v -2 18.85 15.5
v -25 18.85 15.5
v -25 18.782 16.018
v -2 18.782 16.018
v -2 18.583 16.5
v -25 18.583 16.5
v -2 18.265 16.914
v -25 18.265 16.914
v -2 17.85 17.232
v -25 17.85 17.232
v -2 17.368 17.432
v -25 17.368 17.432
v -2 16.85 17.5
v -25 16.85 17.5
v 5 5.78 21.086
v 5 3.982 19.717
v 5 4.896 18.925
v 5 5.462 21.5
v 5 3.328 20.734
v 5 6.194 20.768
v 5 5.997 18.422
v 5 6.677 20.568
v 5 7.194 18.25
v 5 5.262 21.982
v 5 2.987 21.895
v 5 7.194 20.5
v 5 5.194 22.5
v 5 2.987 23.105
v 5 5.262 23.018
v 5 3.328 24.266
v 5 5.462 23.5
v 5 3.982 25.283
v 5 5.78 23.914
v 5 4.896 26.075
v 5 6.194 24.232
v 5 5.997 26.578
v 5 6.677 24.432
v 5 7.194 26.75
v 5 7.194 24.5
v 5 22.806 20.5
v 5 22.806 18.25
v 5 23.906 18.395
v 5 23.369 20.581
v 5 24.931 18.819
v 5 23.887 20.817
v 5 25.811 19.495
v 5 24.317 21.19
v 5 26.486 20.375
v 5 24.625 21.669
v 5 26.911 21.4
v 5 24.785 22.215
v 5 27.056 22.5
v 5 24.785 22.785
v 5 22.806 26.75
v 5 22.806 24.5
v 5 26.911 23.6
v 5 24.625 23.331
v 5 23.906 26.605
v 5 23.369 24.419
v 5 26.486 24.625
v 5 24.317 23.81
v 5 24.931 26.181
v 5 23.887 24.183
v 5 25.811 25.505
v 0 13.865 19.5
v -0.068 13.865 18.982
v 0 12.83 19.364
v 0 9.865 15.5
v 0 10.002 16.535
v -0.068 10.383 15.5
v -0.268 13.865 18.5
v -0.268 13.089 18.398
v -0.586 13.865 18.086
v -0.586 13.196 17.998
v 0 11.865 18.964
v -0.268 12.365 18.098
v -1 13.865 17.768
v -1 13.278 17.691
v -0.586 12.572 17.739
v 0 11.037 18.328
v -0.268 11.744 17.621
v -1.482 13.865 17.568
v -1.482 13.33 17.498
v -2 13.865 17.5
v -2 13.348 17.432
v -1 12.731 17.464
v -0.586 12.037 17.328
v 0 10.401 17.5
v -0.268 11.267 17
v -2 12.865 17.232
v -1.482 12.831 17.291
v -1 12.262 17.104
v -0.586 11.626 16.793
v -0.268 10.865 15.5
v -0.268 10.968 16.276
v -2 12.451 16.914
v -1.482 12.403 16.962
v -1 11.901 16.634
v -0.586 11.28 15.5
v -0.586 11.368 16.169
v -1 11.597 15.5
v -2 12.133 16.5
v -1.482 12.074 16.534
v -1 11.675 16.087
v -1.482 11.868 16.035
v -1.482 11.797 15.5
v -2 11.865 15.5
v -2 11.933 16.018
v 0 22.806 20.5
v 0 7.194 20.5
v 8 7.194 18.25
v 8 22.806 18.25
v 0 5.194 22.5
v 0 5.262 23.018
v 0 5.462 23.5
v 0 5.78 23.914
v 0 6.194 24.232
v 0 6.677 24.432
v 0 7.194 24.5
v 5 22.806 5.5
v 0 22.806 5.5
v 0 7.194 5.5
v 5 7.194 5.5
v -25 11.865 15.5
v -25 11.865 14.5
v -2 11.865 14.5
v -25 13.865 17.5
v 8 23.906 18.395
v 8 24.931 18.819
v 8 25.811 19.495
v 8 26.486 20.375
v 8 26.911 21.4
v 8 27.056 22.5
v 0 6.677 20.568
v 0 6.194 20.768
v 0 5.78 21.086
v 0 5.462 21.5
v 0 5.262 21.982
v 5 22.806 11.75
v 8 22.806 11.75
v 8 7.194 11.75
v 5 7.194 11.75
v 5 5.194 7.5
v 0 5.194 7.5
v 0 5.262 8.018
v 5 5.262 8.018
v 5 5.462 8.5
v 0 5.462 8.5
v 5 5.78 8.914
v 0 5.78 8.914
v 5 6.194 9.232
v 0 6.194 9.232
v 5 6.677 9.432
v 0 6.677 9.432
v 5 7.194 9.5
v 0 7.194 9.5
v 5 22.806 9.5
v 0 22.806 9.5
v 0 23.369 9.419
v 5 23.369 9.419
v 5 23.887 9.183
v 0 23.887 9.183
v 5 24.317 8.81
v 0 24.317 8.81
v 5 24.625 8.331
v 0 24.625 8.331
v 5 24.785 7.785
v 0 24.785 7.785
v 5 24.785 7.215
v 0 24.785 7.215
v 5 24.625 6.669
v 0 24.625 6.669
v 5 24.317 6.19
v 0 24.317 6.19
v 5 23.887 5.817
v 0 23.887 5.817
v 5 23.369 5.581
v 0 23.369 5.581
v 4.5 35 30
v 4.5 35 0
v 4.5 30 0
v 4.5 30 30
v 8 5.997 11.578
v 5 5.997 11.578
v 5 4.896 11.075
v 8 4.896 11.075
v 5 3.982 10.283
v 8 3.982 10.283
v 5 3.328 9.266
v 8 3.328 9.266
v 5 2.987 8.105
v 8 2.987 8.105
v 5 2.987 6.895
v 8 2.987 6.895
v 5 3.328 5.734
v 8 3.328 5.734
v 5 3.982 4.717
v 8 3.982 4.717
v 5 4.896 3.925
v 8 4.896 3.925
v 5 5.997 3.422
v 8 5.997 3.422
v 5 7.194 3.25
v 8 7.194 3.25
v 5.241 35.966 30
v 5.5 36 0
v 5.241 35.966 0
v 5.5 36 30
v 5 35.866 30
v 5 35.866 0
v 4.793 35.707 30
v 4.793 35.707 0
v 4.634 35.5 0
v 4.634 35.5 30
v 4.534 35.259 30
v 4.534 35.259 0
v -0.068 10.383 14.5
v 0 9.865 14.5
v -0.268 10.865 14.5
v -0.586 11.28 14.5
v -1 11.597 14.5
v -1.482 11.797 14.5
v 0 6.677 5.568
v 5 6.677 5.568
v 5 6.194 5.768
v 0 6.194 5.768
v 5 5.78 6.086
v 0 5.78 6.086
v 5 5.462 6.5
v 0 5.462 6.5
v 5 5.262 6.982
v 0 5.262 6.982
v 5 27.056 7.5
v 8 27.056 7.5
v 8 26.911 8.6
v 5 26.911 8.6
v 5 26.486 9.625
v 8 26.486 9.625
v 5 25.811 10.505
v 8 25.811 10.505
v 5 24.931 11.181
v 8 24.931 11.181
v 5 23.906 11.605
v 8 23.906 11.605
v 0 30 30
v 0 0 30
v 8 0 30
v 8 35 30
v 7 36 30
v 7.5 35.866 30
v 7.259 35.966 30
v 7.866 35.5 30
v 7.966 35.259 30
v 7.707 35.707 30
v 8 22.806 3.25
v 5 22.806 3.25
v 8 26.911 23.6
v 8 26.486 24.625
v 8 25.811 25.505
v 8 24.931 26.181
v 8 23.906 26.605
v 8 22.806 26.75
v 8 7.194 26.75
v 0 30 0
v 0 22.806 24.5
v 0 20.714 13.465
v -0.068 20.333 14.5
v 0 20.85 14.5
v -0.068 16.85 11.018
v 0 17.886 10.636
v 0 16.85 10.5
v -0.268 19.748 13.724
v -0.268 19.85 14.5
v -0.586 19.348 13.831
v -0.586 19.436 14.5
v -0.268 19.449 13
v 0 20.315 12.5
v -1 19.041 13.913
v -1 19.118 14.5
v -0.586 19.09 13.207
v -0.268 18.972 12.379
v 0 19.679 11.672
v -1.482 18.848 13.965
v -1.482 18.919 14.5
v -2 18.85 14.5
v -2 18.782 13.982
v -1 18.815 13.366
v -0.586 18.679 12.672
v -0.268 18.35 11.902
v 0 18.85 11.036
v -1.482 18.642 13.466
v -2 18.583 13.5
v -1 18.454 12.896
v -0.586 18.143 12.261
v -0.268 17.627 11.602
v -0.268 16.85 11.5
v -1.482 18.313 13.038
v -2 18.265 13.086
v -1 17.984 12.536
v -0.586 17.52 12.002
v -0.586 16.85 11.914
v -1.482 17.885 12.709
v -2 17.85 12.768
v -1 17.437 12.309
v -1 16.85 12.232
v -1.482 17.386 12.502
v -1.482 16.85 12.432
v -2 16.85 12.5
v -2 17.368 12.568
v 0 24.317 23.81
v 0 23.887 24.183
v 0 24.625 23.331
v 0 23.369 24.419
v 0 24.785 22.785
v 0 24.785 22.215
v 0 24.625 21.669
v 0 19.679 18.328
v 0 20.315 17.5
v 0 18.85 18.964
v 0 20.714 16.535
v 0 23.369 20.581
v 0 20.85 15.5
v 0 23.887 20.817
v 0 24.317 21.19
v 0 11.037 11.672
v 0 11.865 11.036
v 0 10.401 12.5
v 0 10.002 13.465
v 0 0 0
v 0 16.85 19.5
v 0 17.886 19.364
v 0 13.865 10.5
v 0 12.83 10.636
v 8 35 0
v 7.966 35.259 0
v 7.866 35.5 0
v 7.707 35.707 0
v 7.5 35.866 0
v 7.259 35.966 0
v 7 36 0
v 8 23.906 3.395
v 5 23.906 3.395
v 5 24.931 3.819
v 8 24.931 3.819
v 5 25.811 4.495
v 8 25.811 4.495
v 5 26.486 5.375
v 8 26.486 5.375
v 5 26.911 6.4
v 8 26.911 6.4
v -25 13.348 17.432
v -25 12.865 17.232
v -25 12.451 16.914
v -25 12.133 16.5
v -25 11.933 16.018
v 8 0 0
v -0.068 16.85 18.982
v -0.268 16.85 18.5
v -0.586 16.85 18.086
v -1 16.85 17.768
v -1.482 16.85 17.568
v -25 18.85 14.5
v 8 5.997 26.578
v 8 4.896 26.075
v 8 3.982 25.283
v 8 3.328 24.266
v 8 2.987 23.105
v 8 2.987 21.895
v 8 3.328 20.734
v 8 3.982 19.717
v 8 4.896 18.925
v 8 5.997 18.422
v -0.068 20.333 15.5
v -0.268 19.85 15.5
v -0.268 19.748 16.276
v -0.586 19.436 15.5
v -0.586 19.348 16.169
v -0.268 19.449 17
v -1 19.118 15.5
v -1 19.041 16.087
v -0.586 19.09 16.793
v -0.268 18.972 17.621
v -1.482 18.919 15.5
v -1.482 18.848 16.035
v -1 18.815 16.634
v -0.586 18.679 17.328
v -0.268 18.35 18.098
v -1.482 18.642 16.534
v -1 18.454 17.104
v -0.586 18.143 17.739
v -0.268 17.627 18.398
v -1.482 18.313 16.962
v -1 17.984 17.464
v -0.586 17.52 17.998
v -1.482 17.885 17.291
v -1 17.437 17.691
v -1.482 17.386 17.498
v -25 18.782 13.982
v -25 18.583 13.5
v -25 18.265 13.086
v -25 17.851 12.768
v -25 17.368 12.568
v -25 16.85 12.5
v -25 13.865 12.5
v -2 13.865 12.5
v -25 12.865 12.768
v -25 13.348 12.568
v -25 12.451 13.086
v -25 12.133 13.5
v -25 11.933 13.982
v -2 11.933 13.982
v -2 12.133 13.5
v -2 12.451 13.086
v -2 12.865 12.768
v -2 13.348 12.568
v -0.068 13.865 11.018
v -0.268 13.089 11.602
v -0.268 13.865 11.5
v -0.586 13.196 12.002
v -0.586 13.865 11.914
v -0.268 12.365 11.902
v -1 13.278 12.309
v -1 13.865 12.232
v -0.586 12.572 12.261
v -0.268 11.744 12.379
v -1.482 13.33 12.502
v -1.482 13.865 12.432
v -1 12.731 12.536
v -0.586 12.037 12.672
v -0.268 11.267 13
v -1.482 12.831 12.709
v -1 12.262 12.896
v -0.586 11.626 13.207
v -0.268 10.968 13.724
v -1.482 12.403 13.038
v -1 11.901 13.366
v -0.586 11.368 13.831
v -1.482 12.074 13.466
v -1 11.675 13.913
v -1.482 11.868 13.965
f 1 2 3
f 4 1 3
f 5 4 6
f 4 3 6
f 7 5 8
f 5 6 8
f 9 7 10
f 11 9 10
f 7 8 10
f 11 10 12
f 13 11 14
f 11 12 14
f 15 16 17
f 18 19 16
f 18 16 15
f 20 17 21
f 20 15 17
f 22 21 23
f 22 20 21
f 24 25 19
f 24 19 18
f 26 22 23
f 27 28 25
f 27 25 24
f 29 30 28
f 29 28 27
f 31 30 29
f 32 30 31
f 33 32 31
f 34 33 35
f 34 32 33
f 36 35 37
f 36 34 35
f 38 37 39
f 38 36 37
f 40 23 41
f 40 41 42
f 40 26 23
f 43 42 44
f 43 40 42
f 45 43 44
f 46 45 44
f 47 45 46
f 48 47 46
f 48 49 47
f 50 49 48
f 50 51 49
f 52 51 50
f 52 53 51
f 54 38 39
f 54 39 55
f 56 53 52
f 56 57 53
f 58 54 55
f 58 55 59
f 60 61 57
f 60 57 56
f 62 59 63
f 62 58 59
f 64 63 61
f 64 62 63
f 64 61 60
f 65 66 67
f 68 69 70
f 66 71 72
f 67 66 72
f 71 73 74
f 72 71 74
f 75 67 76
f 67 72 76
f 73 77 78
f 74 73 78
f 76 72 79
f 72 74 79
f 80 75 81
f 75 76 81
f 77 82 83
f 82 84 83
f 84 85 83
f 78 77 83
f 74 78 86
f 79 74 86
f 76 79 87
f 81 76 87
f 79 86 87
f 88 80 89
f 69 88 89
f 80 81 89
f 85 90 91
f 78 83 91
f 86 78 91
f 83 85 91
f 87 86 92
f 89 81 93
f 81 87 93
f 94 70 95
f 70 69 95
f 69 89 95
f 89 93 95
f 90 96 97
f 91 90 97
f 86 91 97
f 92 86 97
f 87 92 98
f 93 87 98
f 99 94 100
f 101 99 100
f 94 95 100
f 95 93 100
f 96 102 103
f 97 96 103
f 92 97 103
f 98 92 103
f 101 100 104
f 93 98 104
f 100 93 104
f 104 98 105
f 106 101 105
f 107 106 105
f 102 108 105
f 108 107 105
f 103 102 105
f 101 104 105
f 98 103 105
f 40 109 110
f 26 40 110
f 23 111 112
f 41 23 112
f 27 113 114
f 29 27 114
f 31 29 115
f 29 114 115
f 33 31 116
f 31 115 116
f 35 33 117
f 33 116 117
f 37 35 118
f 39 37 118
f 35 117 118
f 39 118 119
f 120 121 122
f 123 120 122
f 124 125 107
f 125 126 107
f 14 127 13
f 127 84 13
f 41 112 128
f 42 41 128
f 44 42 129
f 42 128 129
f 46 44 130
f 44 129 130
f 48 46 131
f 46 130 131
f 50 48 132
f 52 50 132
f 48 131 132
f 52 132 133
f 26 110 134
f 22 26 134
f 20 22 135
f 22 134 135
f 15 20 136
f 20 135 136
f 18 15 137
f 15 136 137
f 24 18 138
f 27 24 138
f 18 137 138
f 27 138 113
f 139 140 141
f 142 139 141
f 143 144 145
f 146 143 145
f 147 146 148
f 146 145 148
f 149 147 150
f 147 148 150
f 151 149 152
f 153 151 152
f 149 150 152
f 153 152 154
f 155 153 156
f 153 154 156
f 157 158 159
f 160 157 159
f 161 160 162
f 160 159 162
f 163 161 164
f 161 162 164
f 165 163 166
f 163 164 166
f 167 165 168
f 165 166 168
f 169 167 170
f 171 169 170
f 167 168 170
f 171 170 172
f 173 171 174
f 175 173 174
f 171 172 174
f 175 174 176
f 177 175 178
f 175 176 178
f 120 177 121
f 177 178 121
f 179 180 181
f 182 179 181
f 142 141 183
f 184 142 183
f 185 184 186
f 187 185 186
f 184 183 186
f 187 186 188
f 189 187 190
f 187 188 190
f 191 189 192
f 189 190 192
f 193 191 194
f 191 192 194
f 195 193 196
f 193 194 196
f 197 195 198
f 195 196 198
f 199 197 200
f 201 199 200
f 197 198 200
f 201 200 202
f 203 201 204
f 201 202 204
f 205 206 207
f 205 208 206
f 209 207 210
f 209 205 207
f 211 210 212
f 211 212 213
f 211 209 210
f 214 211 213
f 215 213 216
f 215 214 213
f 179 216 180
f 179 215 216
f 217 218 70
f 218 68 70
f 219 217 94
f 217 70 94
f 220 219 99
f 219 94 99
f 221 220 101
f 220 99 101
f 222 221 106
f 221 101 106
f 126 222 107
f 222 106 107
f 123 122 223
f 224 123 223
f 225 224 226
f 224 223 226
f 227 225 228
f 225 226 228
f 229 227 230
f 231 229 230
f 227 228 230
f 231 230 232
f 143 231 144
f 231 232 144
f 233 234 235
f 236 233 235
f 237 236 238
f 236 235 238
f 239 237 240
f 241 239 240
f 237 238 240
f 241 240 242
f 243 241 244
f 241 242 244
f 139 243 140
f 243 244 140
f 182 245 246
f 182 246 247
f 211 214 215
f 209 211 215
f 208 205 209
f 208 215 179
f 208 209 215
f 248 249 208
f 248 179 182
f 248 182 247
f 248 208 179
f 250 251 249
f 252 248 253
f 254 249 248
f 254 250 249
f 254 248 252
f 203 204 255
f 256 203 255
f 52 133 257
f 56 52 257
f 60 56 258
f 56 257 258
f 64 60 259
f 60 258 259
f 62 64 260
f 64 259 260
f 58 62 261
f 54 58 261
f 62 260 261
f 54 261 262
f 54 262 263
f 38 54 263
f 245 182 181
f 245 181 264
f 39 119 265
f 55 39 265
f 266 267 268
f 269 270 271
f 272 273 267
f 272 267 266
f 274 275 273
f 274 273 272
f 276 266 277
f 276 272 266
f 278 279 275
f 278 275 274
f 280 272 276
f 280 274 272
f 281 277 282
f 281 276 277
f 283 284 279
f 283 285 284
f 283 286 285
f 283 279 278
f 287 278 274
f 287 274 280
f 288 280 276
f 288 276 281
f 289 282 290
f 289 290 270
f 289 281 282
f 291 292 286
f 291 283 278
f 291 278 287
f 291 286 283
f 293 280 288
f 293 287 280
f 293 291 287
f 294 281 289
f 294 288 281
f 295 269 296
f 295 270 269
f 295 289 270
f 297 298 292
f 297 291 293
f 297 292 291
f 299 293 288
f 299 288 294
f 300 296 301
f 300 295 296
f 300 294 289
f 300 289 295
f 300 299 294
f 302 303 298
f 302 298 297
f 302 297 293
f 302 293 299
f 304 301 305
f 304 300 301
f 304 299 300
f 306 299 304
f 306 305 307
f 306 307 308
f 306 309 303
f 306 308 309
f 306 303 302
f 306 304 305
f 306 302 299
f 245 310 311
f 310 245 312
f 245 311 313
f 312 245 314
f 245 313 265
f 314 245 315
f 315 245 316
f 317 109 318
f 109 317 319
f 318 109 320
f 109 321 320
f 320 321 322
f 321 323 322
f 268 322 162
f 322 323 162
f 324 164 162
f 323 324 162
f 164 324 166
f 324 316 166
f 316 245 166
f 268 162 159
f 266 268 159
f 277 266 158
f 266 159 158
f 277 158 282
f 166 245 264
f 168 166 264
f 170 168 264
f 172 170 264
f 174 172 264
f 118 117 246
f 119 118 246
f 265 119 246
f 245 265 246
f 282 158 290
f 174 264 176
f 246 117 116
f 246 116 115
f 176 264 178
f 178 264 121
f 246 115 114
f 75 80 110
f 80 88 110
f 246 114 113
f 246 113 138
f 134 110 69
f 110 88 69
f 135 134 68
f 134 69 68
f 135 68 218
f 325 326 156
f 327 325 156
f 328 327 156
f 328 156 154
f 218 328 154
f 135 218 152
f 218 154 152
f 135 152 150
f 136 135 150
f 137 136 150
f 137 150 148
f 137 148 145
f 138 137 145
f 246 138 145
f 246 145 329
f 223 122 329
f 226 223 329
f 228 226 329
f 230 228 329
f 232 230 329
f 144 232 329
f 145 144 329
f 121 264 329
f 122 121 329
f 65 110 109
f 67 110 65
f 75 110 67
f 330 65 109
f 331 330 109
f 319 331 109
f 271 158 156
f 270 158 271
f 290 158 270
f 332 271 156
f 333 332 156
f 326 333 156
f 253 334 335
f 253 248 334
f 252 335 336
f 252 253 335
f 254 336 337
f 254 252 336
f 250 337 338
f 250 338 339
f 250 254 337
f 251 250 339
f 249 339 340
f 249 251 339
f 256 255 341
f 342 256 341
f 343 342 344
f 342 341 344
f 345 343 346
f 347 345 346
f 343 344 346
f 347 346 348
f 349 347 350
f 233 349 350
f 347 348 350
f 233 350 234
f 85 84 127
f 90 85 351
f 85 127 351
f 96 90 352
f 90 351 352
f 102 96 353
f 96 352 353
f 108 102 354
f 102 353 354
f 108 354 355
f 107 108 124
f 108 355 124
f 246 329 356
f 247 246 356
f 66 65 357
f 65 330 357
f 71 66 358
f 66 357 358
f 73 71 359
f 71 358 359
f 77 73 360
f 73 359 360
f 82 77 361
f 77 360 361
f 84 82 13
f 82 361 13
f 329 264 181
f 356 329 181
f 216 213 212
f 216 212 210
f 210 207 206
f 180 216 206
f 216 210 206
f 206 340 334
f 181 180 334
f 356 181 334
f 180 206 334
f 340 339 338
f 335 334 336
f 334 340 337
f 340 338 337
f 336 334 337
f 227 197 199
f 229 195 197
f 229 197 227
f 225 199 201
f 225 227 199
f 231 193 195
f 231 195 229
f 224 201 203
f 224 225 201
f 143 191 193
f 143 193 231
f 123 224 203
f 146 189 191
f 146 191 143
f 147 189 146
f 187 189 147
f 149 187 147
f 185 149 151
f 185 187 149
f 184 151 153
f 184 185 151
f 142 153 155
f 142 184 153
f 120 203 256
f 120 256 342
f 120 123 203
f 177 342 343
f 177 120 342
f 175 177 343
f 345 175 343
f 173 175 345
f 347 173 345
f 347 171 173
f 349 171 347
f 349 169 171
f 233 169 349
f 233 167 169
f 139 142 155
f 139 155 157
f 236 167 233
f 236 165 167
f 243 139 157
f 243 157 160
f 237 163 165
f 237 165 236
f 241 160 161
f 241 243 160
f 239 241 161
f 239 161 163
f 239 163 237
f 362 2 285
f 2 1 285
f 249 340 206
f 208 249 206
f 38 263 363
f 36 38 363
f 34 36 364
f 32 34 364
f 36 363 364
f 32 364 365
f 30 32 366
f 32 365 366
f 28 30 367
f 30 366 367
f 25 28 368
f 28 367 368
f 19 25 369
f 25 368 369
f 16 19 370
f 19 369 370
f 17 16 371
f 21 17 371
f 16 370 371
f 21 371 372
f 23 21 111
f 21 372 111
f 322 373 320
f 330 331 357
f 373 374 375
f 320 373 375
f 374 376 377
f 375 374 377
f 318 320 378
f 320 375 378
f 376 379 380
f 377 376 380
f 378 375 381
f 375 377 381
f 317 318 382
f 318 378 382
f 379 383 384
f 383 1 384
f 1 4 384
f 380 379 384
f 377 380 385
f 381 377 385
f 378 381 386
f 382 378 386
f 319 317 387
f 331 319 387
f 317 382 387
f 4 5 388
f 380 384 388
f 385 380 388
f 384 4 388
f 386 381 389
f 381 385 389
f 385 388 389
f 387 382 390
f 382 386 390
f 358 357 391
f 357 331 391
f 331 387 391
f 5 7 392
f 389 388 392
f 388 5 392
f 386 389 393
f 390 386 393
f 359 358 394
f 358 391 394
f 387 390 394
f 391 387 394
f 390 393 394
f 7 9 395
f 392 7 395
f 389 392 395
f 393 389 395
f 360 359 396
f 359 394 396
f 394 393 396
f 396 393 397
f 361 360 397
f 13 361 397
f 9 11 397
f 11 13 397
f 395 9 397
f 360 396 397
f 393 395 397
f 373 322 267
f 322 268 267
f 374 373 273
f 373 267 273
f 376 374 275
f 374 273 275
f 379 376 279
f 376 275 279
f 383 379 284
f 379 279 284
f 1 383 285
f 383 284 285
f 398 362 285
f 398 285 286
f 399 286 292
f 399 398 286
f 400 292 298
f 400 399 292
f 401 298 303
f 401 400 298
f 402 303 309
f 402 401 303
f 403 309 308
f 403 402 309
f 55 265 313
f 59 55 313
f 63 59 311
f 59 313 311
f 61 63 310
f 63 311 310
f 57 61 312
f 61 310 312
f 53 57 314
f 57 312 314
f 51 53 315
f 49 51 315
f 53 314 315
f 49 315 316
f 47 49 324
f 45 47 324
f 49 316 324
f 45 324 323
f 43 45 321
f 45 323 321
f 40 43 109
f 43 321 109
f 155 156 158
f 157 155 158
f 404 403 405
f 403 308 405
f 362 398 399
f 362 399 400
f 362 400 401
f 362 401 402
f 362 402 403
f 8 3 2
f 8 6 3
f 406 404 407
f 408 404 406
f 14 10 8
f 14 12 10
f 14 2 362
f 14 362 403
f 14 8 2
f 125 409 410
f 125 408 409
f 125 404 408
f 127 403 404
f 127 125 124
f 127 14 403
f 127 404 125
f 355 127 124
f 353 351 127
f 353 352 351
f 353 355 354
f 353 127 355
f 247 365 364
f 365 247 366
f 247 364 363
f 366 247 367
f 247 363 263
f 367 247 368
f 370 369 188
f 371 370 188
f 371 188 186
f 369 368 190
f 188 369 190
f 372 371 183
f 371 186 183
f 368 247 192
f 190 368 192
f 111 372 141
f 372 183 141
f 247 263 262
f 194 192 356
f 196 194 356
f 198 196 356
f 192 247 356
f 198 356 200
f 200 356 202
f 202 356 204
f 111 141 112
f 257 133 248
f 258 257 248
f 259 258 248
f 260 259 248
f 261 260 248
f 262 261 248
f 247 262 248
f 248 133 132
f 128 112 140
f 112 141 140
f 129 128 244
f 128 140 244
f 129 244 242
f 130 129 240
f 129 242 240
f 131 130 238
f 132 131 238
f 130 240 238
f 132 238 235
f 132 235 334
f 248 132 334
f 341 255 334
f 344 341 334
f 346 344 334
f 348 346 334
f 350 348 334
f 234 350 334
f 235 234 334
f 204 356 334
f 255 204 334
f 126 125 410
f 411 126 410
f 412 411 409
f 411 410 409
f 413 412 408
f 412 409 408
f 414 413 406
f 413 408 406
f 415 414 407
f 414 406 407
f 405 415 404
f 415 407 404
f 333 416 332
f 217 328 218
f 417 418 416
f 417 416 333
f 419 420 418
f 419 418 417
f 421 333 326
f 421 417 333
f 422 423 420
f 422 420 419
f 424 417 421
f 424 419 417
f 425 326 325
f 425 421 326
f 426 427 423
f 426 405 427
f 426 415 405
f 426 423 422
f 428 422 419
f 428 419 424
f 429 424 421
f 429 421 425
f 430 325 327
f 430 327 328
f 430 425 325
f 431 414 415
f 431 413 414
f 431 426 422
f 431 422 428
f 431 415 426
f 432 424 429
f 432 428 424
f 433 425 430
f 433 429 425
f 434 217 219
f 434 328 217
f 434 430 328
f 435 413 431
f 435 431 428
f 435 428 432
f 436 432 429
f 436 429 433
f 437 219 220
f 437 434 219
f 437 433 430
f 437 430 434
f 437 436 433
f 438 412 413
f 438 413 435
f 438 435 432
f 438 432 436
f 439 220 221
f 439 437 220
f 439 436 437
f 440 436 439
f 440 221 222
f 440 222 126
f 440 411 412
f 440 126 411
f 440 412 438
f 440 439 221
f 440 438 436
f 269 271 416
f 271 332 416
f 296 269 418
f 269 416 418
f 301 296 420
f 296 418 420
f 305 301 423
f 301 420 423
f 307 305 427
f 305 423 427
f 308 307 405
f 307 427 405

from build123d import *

# Parameters (mm, degrees)
F1_DEPTH = 30
F3_DEPTH = 8.001
F4_R     = 1
F6_DEPTH = 3
F8_DEPTH = 25
F9_R     = 2


with BuildPart() as f1:
    # F0 (on Top) → F1 (new body)
    with BuildSketch(Plane.XY):
        Polygon((8, 0), (8, 36), (4.5, 36), (4.5, 30), (0, 30), (0, 0), align=None)
    extrude(amount=F1_DEPTH)

    # F2 (on face) → F3 (cut, through all)
    with BuildSketch(Plane(origin=(0, 0, 0), x_dir=(0, -1, 0), z_dir=(-1, 0, 0))):
        with BuildLine():
            ThreePointArc((-7.194215, 20.5), (-5.780001, 21.085786), (-5.194215, 22.5))
            ThreePointArc((-5.194215, 22.5), (-5.780001, 23.914214), (-7.194215, 24.5))
            ThreePointArc((-7.194215, 24.5), (-9.194215, 22.5), (-7.194215, 20.5))
        make_face()
        with BuildLine():
            ThreePointArc((-7.194215, 20.5), (-9.194215, 22.5), (-7.194215, 24.5))
            Line((-7.194215, 24.5), (-15, 24.5))
            Line((-15, 24.5), (-22.805785, 24.5))
            ThreePointArc((-22.805785, 24.5), (-21.391572, 23.914214), (-20.805785, 22.5))
            ThreePointArc((-20.805785, 22.5), (-21.391572, 21.085786), (-22.805785, 20.5))
            Line((-22.805785, 20.5), (-15, 20.5))
            Line((-15, 20.5), (-7.194215, 20.5))
        make_face()
        with BuildLine():
            ThreePointArc((-20.805785, 22.5), (-21.391572, 23.914214), (-22.805785, 24.5))
            ThreePointArc((-22.805785, 24.5), (-24.805785, 22.5), (-22.805785, 20.5))
            ThreePointArc((-22.805785, 20.5), (-21.391572, 21.085786), (-20.805785, 22.5))
        make_face()
        with BuildLine():
            ThreePointArc((-7.194215, 5.5), (-5.780001, 6.085786), (-5.194215, 7.5))
            ThreePointArc((-5.194215, 7.5), (-5.780001, 8.914214), (-7.194215, 9.5))
            ThreePointArc((-7.194215, 9.5), (-9.194215, 7.5), (-7.194215, 5.5))
        make_face()
        with BuildLine():
            ThreePointArc((-7.194215, 5.5), (-9.194215, 7.5), (-7.194215, 9.5))
            Line((-7.194215, 9.5), (-15, 9.5))
            Line((-15, 9.5), (-22.805785, 9.5))
            ThreePointArc((-22.805785, 9.5), (-21.391572, 8.914214), (-20.805785, 7.5))
            ThreePointArc((-20.805785, 7.5), (-21.391572, 6.085786), (-22.805785, 5.5))
            Line((-22.805785, 5.5), (-15, 5.5))
            Line((-15, 5.5), (-7.194215, 5.5))
        make_face()
        with BuildLine():
            ThreePointArc((-20.805785, 7.5), (-21.391572, 8.914214), (-22.805785, 9.5))
            ThreePointArc((-22.805785, 9.5), (-24.805785, 7.5), (-22.805785, 5.5))
            ThreePointArc((-22.805785, 5.5), (-21.391572, 6.085786), (-20.805785, 7.5))
        make_face()
    extrude(amount=-F3_DEPTH, mode=Mode.SUBTRACT)

    # F4
    f4_edges = [f1.edges().sort_by_distance(p)[0] for p in [
        (4.5, 36, 15),
        (8, 36, 15),
    ]]
    fillet(f4_edges, radius=F4_R)

    # F5 (on face) → F6 (cut)
    with BuildSketch(Plane.YZ.offset(8)):
        with BuildLine():
            ThreePointArc((7.194215, 18.25), (10.199419, 19.494796), (11.444215, 22.5))
            ThreePointArc((11.444215, 22.5), (10.199419, 25.505204), (7.194215, 26.75))
            ThreePointArc((7.194215, 26.75), (2.944215, 22.5), (7.194215, 18.25))
        make_face()
        with BuildLine():
            ThreePointArc((7.194215, 26.75), (10.199419, 25.505204), (11.444215, 22.5))
            ThreePointArc((11.444215, 22.5), (10.199419, 19.494796), (7.194215, 18.25))
            Line((7.194215, 18.25), (22.805785, 18.25))
            ThreePointArc((22.805785, 18.25), (18.555785, 22.5), (22.805785, 26.75))
            Line((22.805785, 26.75), (7.194215, 26.75))
        make_face()
        with BuildLine():
            ThreePointArc((27.055785, 22.5), (25.810989, 25.505204), (22.805785, 26.75))
            ThreePointArc((22.805785, 26.75), (18.555785, 22.5), (22.805785, 18.25))
            ThreePointArc((22.805785, 18.25), (25.810989, 19.494796), (27.055785, 22.5))
        make_face()
        with BuildLine():
            ThreePointArc((7.194215, 3.25), (10.199419, 4.494796), (11.444215, 7.5))
            ThreePointArc((11.444215, 7.5), (10.199419, 10.505204), (7.194215, 11.75))
            ThreePointArc((7.194215, 11.75), (2.944215, 7.5), (7.194215, 3.25))
        make_face()
        with BuildLine():
            ThreePointArc((7.194215, 11.75), (10.199419, 10.505204), (11.444215, 7.5))
            ThreePointArc((11.444215, 7.5), (10.199419, 4.494796), (7.194215, 3.25))
            Line((7.194215, 3.25), (22.805785, 3.25))
            ThreePointArc((22.805785, 3.25), (18.555785, 7.5), (22.805785, 11.75))
            Line((22.805785, 11.75), (7.194215, 11.75))
        make_face()
        with BuildLine():
            ThreePointArc((27.055785, 7.5), (25.810989, 10.505204), (22.805785, 11.75))
            ThreePointArc((22.805785, 11.75), (18.555785, 7.5), (22.805785, 3.25))
            ThreePointArc((22.805785, 3.25), (25.810989, 4.494796), (27.055785, 7.5))
        make_face()
    extrude(amount=-F6_DEPTH, mode=Mode.SUBTRACT)

    # F7 (on face) → F8 (join)
    with BuildSketch(Plane(origin=(0, 0, 0), x_dir=(0, -1, 0), z_dir=(-1, 0, 0))):
        Polygon((-18.8505, 12.5), (-11.865322, 12.5), (-11.865322, 15), (-11.865322, 17.5), (-18.8505, 17.5), (-18.8505, 15), align=None)
    extrude(amount=F8_DEPTH)

    # F9
    f9_edges = [f1.edges().sort_by_distance(p)[0] for p in [
        (0, 18.8505, 15),
        (0, 15.357911, 17.5),
        (0, 15.357911, 12.5),
        (0, 11.865322, 15),
        (-12.5, 11.865322, 12.5),
        (-12.5, 11.865322, 17.5),
        (-12.5, 18.8505, 12.5),
        (-12.5, 18.8505, 17.5),
    ]]
    fillet(f9_edges, radius=F9_R)


solid = f1.part
